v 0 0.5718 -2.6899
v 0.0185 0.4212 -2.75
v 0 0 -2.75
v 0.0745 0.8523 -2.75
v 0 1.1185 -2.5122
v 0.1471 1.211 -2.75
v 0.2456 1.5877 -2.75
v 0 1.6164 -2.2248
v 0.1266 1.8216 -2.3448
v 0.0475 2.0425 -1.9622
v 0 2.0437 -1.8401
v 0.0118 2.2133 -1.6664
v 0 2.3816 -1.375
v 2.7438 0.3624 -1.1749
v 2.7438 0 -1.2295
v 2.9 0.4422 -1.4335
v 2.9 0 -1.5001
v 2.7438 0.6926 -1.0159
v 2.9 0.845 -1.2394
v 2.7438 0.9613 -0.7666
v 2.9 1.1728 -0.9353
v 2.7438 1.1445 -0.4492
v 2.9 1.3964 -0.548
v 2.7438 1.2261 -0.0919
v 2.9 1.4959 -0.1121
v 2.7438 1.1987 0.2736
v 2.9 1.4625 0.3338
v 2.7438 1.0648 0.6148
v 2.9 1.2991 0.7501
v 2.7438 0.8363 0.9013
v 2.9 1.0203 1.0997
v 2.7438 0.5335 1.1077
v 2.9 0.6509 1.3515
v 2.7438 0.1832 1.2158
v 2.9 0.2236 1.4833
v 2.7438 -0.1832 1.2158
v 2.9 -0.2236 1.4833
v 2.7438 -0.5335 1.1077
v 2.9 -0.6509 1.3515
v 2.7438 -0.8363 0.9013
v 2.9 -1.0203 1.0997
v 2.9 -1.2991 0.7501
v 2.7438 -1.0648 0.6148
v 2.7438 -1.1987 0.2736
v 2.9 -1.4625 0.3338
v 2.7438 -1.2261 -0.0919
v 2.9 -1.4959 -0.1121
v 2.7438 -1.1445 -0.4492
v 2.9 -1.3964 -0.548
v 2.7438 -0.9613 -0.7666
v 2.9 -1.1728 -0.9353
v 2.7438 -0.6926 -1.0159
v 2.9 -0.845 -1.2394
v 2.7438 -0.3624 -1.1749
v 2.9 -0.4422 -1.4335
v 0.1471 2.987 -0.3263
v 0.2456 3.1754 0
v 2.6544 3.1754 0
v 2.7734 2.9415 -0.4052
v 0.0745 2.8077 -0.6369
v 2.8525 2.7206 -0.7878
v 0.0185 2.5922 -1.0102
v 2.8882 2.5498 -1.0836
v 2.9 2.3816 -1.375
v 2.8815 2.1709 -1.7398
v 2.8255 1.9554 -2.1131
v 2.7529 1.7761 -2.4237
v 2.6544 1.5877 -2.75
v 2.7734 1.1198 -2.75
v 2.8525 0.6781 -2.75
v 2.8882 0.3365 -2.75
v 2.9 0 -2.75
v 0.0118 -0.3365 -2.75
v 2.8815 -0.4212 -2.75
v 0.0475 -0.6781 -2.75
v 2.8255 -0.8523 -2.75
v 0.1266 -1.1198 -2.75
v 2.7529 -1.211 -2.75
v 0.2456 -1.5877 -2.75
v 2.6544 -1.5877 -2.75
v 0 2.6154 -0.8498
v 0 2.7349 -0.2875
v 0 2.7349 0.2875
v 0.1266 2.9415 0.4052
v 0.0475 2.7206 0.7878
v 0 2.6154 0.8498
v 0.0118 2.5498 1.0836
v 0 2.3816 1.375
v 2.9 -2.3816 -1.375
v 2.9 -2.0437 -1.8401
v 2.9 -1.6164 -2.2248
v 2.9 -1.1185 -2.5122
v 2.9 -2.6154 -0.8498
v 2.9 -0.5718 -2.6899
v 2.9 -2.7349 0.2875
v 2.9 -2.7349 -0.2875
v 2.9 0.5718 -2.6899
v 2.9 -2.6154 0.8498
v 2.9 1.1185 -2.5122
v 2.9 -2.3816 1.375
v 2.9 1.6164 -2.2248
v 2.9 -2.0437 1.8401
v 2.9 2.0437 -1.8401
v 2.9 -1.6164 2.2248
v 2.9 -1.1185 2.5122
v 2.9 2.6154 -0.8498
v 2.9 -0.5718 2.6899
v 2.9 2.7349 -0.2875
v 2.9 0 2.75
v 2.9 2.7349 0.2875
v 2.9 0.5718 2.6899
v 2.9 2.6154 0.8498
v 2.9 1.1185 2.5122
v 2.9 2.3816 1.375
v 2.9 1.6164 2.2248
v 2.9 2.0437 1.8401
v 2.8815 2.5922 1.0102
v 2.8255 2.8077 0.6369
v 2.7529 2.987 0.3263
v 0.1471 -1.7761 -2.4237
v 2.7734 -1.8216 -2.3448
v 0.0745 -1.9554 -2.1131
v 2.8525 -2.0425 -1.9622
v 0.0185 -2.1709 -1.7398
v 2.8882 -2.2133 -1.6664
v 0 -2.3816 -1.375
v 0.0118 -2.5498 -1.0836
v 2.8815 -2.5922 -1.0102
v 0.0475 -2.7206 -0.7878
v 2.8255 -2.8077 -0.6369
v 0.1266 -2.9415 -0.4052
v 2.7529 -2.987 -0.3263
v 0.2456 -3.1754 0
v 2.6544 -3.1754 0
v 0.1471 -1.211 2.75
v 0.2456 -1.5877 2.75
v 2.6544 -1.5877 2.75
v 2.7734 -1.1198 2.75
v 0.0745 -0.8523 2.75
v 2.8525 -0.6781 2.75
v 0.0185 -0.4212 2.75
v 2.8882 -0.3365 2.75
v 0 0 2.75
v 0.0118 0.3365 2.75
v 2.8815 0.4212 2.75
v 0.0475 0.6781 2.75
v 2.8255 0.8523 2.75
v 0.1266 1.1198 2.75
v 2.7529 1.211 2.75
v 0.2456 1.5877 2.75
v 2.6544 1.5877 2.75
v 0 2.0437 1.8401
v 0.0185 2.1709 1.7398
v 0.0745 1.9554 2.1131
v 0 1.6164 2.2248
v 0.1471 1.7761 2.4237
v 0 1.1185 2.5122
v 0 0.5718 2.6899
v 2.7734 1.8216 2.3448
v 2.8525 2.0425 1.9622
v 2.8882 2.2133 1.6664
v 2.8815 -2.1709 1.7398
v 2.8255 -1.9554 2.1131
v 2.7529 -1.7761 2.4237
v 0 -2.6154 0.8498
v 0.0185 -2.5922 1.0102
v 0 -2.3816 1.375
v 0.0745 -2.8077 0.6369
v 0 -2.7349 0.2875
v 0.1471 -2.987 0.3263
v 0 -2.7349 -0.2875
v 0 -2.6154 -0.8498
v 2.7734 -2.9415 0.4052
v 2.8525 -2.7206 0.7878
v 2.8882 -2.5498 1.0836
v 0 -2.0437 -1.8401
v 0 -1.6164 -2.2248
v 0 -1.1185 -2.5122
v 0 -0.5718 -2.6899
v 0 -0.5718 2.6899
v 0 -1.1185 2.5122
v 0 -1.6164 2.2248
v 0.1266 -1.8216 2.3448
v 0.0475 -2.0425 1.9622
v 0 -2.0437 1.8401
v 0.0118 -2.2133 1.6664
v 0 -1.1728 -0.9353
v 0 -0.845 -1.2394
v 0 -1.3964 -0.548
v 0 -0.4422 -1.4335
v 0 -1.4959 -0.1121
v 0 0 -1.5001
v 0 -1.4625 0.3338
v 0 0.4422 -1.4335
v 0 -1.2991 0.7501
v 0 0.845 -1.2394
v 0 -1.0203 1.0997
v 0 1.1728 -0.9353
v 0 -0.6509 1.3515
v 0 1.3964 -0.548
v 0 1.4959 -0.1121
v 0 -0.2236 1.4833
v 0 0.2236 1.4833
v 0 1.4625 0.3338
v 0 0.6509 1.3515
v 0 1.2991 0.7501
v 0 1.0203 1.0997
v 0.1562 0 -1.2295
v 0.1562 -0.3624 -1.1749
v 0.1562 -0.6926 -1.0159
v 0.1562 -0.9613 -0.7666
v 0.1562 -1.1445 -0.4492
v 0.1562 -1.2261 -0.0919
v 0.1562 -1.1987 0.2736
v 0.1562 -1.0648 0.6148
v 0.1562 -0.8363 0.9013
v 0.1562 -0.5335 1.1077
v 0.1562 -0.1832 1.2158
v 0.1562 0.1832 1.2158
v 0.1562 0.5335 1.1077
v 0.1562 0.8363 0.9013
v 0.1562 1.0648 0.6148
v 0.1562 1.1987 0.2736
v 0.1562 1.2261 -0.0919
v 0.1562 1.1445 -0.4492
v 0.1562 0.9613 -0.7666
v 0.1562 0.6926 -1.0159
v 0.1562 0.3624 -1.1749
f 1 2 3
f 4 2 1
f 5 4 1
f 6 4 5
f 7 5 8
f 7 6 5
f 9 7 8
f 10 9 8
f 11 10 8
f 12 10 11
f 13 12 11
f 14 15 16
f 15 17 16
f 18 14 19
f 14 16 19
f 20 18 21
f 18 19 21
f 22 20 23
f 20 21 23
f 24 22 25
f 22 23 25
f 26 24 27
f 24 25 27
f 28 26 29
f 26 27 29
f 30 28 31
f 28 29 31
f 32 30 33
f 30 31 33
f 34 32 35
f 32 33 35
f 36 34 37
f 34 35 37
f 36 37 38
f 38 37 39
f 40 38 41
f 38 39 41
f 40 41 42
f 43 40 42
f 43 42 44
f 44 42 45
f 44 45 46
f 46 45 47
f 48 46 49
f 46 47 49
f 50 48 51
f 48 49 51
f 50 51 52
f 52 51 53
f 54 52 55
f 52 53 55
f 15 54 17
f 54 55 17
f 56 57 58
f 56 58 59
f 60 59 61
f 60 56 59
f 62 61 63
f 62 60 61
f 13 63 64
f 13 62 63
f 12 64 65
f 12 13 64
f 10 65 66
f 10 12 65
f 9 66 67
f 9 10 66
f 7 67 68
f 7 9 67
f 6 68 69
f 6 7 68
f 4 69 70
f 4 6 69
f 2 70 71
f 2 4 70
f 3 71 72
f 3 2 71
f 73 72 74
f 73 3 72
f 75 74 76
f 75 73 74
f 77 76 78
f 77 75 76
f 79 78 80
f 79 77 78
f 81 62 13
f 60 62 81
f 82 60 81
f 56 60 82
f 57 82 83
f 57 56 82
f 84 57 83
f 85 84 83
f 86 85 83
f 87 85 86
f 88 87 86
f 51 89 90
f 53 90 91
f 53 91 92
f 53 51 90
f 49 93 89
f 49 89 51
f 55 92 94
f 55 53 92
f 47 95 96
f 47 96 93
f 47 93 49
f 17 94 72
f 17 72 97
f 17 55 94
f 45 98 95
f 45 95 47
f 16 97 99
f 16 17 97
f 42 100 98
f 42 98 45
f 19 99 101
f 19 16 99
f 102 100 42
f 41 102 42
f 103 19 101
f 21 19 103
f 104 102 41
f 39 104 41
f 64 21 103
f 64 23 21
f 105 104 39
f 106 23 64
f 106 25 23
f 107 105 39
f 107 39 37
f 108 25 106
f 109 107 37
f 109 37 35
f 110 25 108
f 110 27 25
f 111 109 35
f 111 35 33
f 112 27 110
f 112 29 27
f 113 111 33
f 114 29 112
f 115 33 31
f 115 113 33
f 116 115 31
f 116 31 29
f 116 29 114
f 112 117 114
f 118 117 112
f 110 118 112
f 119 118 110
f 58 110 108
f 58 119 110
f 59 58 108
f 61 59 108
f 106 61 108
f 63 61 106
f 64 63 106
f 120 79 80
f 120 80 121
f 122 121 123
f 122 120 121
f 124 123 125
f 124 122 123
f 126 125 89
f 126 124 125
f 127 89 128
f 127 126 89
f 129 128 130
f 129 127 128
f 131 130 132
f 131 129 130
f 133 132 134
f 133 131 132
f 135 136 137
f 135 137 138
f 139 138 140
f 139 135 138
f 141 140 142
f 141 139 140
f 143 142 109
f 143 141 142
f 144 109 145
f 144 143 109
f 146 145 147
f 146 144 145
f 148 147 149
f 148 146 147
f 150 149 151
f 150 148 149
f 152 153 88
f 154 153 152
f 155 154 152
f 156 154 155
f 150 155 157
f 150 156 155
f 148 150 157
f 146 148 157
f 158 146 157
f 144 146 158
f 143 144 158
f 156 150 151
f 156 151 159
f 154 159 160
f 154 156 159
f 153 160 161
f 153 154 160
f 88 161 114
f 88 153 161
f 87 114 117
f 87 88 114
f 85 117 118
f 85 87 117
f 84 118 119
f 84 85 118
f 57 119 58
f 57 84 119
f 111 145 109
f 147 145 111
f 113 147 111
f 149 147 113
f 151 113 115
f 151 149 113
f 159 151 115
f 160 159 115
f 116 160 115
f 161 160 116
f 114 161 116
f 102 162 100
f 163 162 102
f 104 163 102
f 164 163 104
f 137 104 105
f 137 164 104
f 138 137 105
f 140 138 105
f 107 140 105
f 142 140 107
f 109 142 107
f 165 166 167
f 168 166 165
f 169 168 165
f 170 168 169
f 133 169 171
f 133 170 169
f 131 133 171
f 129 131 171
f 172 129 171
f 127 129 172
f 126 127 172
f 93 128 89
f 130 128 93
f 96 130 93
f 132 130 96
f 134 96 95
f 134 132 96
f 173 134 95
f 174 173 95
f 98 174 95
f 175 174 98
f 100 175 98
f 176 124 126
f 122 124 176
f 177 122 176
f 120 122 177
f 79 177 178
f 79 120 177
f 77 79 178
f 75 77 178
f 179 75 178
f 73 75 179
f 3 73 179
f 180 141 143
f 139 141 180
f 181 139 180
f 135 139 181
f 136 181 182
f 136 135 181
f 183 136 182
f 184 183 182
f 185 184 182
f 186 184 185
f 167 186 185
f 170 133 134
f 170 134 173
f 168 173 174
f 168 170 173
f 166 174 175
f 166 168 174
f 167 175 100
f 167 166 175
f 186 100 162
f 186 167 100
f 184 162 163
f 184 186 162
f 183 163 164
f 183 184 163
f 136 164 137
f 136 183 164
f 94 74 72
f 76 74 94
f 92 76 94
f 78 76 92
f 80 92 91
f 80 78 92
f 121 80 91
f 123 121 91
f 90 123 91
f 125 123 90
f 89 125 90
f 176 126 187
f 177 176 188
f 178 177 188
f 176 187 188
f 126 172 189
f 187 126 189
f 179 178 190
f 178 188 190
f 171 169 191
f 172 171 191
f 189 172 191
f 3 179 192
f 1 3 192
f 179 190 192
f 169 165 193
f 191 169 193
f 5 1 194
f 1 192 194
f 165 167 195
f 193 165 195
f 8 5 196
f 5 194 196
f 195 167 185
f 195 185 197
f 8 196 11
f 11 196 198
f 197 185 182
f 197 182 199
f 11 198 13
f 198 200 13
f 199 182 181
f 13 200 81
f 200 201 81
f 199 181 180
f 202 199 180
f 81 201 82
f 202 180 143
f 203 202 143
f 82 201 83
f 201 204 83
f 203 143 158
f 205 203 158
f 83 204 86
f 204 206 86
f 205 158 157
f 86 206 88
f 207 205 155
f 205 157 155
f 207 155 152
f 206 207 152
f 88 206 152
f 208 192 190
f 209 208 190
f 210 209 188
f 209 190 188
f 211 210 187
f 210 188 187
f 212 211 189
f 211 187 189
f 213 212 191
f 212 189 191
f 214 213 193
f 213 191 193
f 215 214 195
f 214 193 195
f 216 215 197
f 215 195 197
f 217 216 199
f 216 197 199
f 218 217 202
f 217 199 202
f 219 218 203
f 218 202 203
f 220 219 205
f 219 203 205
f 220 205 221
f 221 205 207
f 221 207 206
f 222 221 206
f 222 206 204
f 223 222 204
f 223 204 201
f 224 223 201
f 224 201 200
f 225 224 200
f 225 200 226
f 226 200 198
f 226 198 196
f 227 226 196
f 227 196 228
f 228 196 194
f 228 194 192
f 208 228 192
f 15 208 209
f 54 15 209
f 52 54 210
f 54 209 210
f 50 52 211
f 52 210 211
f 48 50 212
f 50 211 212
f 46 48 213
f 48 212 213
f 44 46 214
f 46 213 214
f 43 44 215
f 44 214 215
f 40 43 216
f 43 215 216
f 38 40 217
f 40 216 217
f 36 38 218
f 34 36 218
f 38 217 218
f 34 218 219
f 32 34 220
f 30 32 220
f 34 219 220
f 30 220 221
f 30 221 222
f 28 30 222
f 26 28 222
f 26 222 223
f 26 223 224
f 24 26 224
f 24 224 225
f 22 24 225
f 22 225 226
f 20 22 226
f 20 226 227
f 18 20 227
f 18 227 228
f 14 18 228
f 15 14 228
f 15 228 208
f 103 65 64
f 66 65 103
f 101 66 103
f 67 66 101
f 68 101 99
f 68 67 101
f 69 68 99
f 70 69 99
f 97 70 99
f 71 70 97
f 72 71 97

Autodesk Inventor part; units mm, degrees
ref_plane "YZ Plane" through (0, 0, 0) normal (1, 0, 0) x (0, 1, 0)
ref_plane "XZ Plane" through (0, 0, 0) normal (0, 1, 0) x (-1, 0, 0)
sketch "Esquisse1" plane through (0, 0, 0) normal (1, 0, 0) x (0, 1, 0)
  line L0 (-3.1754, 0) -> (-1.5877, 2.75)
  line L1 (-1.5877, 2.75) -> (1.5877, 2.75)
  line L2 (1.5877, 2.75) -> (3.1754, 0)
  line L3 (3.1754, 0) -> (1.5877, -2.75)
  line L4 (1.5877, -2.75) -> (-1.5877, -2.75)
  line L5 (-1.5877, -2.75) -> (-3.1754, 0)
  point P0 (0, 0)
  point P1 (0, 0)
  dimension "d0" = 6.3509
extrude "Corps" add sketch "Esquisse1" along normal blind 2.9
sketch "Esquisse2" plane through (0, 0, 0) normal (0, 0, 1) x (1, 0, 0)
  line L0 (0, 1.5877) -> (0, 3.1754) projected
  line L1 (0, 3.1754) -> (2.9, 3.1754) projected
  line L2 (2.9, 1.5877) -> (2.9, 3.1754) projected
  line L3 (-0.58, 0) -> (3.48, 0) projected
  line L4 (0.2456, 3.1754) -> (0, 2.75)
  line L5 (2.6544, 3.1754) -> (2.9, 2.75)
  dimension "d3" = 30
  dimension "d4" = 30
  dimension "d5" = 5.5
  dimension "d6" = 5.5
revolve "Chanfrein1" cut sketch "Esquisse2" angle 360 about axis through (-10, 0, 0) along (1, 0, 0)
sketch "Esquisse3" plane through (2.9, 0, 0) normal (1, 0, 0) x (0, 0, -1)
  arc A0 (-1.375, -2.3816) -> (1.375, -2.3816) centre (0, 0) ccw projected
hole "Filetage" at (2.9, 0, 0) direction (-1, 0, 0) diameter 2.459 end through all thread size "M3x0.5" class "6H" standard "ANSI Metric M Profile"
chamfer "Chanfrein2" distance 0.2706 angle 30 1 edges at (2.9, 0, 1.2295) measured on face at (2.9, -2.2301, -0.0494)
chamfer "Chanfrein3" distance 0.2706 angle 30 1 edges at (0, 0, 1.2295) measured on face at (0, -2.2301, -0.0494)
ref_plane "Work Plane1" through (-5.9878, 0, 0) normal (0, -0.8660254, -0.5) x (1, 0, 0)
equation "\"d0\" = 1.1547 * SW"
equation "\"d1\" = KOH"
equation "\"d3\" = ANG1"
equation "\"d4\" = ANG2"
equation "\"d5\" = SW0"
equation "\"d6\" = SW01"
equation "\"d8\" = -0.5 * GD1 + 0.5 * NND"
equation "\"d40\" = -0.5 * GD1 + 0.5 * NND"
equation "\"d10\" = -0.5 * GD1 + 0.5 * NND"
equation "\"d41\" = -0.5 * GD1 + 0.5 * NND"
equation "\"ANG1\" = 30deg"
equation "\"ANG2\" = 30deg"
equation "\"NND\" = 3"
equation "\"KOH\" = 2.9"
equation "\"SW\" = 5.5"
equation "\"SW0\" = SW"
equation "\"SW01\" = SW"
equation "\"GUL\" = 0.541266 * PTC"
equation "\"THREADDIA\" = 3"
equation "\"TOA\" = 30deg"
equation "\"PTC\" = 0.5"
equation "\"E0\" = 1.155 * SW"
equation "\"GAL\" = 0.541266 * PTC"
equation "\"SD2\" = 0"
equation "\"WFT\" = 0"
equation "\"GD1\" = 2.458734"
properties part number "ANSI B18.2.4.2M - M3 x 0,5" material "Acier, doux"
